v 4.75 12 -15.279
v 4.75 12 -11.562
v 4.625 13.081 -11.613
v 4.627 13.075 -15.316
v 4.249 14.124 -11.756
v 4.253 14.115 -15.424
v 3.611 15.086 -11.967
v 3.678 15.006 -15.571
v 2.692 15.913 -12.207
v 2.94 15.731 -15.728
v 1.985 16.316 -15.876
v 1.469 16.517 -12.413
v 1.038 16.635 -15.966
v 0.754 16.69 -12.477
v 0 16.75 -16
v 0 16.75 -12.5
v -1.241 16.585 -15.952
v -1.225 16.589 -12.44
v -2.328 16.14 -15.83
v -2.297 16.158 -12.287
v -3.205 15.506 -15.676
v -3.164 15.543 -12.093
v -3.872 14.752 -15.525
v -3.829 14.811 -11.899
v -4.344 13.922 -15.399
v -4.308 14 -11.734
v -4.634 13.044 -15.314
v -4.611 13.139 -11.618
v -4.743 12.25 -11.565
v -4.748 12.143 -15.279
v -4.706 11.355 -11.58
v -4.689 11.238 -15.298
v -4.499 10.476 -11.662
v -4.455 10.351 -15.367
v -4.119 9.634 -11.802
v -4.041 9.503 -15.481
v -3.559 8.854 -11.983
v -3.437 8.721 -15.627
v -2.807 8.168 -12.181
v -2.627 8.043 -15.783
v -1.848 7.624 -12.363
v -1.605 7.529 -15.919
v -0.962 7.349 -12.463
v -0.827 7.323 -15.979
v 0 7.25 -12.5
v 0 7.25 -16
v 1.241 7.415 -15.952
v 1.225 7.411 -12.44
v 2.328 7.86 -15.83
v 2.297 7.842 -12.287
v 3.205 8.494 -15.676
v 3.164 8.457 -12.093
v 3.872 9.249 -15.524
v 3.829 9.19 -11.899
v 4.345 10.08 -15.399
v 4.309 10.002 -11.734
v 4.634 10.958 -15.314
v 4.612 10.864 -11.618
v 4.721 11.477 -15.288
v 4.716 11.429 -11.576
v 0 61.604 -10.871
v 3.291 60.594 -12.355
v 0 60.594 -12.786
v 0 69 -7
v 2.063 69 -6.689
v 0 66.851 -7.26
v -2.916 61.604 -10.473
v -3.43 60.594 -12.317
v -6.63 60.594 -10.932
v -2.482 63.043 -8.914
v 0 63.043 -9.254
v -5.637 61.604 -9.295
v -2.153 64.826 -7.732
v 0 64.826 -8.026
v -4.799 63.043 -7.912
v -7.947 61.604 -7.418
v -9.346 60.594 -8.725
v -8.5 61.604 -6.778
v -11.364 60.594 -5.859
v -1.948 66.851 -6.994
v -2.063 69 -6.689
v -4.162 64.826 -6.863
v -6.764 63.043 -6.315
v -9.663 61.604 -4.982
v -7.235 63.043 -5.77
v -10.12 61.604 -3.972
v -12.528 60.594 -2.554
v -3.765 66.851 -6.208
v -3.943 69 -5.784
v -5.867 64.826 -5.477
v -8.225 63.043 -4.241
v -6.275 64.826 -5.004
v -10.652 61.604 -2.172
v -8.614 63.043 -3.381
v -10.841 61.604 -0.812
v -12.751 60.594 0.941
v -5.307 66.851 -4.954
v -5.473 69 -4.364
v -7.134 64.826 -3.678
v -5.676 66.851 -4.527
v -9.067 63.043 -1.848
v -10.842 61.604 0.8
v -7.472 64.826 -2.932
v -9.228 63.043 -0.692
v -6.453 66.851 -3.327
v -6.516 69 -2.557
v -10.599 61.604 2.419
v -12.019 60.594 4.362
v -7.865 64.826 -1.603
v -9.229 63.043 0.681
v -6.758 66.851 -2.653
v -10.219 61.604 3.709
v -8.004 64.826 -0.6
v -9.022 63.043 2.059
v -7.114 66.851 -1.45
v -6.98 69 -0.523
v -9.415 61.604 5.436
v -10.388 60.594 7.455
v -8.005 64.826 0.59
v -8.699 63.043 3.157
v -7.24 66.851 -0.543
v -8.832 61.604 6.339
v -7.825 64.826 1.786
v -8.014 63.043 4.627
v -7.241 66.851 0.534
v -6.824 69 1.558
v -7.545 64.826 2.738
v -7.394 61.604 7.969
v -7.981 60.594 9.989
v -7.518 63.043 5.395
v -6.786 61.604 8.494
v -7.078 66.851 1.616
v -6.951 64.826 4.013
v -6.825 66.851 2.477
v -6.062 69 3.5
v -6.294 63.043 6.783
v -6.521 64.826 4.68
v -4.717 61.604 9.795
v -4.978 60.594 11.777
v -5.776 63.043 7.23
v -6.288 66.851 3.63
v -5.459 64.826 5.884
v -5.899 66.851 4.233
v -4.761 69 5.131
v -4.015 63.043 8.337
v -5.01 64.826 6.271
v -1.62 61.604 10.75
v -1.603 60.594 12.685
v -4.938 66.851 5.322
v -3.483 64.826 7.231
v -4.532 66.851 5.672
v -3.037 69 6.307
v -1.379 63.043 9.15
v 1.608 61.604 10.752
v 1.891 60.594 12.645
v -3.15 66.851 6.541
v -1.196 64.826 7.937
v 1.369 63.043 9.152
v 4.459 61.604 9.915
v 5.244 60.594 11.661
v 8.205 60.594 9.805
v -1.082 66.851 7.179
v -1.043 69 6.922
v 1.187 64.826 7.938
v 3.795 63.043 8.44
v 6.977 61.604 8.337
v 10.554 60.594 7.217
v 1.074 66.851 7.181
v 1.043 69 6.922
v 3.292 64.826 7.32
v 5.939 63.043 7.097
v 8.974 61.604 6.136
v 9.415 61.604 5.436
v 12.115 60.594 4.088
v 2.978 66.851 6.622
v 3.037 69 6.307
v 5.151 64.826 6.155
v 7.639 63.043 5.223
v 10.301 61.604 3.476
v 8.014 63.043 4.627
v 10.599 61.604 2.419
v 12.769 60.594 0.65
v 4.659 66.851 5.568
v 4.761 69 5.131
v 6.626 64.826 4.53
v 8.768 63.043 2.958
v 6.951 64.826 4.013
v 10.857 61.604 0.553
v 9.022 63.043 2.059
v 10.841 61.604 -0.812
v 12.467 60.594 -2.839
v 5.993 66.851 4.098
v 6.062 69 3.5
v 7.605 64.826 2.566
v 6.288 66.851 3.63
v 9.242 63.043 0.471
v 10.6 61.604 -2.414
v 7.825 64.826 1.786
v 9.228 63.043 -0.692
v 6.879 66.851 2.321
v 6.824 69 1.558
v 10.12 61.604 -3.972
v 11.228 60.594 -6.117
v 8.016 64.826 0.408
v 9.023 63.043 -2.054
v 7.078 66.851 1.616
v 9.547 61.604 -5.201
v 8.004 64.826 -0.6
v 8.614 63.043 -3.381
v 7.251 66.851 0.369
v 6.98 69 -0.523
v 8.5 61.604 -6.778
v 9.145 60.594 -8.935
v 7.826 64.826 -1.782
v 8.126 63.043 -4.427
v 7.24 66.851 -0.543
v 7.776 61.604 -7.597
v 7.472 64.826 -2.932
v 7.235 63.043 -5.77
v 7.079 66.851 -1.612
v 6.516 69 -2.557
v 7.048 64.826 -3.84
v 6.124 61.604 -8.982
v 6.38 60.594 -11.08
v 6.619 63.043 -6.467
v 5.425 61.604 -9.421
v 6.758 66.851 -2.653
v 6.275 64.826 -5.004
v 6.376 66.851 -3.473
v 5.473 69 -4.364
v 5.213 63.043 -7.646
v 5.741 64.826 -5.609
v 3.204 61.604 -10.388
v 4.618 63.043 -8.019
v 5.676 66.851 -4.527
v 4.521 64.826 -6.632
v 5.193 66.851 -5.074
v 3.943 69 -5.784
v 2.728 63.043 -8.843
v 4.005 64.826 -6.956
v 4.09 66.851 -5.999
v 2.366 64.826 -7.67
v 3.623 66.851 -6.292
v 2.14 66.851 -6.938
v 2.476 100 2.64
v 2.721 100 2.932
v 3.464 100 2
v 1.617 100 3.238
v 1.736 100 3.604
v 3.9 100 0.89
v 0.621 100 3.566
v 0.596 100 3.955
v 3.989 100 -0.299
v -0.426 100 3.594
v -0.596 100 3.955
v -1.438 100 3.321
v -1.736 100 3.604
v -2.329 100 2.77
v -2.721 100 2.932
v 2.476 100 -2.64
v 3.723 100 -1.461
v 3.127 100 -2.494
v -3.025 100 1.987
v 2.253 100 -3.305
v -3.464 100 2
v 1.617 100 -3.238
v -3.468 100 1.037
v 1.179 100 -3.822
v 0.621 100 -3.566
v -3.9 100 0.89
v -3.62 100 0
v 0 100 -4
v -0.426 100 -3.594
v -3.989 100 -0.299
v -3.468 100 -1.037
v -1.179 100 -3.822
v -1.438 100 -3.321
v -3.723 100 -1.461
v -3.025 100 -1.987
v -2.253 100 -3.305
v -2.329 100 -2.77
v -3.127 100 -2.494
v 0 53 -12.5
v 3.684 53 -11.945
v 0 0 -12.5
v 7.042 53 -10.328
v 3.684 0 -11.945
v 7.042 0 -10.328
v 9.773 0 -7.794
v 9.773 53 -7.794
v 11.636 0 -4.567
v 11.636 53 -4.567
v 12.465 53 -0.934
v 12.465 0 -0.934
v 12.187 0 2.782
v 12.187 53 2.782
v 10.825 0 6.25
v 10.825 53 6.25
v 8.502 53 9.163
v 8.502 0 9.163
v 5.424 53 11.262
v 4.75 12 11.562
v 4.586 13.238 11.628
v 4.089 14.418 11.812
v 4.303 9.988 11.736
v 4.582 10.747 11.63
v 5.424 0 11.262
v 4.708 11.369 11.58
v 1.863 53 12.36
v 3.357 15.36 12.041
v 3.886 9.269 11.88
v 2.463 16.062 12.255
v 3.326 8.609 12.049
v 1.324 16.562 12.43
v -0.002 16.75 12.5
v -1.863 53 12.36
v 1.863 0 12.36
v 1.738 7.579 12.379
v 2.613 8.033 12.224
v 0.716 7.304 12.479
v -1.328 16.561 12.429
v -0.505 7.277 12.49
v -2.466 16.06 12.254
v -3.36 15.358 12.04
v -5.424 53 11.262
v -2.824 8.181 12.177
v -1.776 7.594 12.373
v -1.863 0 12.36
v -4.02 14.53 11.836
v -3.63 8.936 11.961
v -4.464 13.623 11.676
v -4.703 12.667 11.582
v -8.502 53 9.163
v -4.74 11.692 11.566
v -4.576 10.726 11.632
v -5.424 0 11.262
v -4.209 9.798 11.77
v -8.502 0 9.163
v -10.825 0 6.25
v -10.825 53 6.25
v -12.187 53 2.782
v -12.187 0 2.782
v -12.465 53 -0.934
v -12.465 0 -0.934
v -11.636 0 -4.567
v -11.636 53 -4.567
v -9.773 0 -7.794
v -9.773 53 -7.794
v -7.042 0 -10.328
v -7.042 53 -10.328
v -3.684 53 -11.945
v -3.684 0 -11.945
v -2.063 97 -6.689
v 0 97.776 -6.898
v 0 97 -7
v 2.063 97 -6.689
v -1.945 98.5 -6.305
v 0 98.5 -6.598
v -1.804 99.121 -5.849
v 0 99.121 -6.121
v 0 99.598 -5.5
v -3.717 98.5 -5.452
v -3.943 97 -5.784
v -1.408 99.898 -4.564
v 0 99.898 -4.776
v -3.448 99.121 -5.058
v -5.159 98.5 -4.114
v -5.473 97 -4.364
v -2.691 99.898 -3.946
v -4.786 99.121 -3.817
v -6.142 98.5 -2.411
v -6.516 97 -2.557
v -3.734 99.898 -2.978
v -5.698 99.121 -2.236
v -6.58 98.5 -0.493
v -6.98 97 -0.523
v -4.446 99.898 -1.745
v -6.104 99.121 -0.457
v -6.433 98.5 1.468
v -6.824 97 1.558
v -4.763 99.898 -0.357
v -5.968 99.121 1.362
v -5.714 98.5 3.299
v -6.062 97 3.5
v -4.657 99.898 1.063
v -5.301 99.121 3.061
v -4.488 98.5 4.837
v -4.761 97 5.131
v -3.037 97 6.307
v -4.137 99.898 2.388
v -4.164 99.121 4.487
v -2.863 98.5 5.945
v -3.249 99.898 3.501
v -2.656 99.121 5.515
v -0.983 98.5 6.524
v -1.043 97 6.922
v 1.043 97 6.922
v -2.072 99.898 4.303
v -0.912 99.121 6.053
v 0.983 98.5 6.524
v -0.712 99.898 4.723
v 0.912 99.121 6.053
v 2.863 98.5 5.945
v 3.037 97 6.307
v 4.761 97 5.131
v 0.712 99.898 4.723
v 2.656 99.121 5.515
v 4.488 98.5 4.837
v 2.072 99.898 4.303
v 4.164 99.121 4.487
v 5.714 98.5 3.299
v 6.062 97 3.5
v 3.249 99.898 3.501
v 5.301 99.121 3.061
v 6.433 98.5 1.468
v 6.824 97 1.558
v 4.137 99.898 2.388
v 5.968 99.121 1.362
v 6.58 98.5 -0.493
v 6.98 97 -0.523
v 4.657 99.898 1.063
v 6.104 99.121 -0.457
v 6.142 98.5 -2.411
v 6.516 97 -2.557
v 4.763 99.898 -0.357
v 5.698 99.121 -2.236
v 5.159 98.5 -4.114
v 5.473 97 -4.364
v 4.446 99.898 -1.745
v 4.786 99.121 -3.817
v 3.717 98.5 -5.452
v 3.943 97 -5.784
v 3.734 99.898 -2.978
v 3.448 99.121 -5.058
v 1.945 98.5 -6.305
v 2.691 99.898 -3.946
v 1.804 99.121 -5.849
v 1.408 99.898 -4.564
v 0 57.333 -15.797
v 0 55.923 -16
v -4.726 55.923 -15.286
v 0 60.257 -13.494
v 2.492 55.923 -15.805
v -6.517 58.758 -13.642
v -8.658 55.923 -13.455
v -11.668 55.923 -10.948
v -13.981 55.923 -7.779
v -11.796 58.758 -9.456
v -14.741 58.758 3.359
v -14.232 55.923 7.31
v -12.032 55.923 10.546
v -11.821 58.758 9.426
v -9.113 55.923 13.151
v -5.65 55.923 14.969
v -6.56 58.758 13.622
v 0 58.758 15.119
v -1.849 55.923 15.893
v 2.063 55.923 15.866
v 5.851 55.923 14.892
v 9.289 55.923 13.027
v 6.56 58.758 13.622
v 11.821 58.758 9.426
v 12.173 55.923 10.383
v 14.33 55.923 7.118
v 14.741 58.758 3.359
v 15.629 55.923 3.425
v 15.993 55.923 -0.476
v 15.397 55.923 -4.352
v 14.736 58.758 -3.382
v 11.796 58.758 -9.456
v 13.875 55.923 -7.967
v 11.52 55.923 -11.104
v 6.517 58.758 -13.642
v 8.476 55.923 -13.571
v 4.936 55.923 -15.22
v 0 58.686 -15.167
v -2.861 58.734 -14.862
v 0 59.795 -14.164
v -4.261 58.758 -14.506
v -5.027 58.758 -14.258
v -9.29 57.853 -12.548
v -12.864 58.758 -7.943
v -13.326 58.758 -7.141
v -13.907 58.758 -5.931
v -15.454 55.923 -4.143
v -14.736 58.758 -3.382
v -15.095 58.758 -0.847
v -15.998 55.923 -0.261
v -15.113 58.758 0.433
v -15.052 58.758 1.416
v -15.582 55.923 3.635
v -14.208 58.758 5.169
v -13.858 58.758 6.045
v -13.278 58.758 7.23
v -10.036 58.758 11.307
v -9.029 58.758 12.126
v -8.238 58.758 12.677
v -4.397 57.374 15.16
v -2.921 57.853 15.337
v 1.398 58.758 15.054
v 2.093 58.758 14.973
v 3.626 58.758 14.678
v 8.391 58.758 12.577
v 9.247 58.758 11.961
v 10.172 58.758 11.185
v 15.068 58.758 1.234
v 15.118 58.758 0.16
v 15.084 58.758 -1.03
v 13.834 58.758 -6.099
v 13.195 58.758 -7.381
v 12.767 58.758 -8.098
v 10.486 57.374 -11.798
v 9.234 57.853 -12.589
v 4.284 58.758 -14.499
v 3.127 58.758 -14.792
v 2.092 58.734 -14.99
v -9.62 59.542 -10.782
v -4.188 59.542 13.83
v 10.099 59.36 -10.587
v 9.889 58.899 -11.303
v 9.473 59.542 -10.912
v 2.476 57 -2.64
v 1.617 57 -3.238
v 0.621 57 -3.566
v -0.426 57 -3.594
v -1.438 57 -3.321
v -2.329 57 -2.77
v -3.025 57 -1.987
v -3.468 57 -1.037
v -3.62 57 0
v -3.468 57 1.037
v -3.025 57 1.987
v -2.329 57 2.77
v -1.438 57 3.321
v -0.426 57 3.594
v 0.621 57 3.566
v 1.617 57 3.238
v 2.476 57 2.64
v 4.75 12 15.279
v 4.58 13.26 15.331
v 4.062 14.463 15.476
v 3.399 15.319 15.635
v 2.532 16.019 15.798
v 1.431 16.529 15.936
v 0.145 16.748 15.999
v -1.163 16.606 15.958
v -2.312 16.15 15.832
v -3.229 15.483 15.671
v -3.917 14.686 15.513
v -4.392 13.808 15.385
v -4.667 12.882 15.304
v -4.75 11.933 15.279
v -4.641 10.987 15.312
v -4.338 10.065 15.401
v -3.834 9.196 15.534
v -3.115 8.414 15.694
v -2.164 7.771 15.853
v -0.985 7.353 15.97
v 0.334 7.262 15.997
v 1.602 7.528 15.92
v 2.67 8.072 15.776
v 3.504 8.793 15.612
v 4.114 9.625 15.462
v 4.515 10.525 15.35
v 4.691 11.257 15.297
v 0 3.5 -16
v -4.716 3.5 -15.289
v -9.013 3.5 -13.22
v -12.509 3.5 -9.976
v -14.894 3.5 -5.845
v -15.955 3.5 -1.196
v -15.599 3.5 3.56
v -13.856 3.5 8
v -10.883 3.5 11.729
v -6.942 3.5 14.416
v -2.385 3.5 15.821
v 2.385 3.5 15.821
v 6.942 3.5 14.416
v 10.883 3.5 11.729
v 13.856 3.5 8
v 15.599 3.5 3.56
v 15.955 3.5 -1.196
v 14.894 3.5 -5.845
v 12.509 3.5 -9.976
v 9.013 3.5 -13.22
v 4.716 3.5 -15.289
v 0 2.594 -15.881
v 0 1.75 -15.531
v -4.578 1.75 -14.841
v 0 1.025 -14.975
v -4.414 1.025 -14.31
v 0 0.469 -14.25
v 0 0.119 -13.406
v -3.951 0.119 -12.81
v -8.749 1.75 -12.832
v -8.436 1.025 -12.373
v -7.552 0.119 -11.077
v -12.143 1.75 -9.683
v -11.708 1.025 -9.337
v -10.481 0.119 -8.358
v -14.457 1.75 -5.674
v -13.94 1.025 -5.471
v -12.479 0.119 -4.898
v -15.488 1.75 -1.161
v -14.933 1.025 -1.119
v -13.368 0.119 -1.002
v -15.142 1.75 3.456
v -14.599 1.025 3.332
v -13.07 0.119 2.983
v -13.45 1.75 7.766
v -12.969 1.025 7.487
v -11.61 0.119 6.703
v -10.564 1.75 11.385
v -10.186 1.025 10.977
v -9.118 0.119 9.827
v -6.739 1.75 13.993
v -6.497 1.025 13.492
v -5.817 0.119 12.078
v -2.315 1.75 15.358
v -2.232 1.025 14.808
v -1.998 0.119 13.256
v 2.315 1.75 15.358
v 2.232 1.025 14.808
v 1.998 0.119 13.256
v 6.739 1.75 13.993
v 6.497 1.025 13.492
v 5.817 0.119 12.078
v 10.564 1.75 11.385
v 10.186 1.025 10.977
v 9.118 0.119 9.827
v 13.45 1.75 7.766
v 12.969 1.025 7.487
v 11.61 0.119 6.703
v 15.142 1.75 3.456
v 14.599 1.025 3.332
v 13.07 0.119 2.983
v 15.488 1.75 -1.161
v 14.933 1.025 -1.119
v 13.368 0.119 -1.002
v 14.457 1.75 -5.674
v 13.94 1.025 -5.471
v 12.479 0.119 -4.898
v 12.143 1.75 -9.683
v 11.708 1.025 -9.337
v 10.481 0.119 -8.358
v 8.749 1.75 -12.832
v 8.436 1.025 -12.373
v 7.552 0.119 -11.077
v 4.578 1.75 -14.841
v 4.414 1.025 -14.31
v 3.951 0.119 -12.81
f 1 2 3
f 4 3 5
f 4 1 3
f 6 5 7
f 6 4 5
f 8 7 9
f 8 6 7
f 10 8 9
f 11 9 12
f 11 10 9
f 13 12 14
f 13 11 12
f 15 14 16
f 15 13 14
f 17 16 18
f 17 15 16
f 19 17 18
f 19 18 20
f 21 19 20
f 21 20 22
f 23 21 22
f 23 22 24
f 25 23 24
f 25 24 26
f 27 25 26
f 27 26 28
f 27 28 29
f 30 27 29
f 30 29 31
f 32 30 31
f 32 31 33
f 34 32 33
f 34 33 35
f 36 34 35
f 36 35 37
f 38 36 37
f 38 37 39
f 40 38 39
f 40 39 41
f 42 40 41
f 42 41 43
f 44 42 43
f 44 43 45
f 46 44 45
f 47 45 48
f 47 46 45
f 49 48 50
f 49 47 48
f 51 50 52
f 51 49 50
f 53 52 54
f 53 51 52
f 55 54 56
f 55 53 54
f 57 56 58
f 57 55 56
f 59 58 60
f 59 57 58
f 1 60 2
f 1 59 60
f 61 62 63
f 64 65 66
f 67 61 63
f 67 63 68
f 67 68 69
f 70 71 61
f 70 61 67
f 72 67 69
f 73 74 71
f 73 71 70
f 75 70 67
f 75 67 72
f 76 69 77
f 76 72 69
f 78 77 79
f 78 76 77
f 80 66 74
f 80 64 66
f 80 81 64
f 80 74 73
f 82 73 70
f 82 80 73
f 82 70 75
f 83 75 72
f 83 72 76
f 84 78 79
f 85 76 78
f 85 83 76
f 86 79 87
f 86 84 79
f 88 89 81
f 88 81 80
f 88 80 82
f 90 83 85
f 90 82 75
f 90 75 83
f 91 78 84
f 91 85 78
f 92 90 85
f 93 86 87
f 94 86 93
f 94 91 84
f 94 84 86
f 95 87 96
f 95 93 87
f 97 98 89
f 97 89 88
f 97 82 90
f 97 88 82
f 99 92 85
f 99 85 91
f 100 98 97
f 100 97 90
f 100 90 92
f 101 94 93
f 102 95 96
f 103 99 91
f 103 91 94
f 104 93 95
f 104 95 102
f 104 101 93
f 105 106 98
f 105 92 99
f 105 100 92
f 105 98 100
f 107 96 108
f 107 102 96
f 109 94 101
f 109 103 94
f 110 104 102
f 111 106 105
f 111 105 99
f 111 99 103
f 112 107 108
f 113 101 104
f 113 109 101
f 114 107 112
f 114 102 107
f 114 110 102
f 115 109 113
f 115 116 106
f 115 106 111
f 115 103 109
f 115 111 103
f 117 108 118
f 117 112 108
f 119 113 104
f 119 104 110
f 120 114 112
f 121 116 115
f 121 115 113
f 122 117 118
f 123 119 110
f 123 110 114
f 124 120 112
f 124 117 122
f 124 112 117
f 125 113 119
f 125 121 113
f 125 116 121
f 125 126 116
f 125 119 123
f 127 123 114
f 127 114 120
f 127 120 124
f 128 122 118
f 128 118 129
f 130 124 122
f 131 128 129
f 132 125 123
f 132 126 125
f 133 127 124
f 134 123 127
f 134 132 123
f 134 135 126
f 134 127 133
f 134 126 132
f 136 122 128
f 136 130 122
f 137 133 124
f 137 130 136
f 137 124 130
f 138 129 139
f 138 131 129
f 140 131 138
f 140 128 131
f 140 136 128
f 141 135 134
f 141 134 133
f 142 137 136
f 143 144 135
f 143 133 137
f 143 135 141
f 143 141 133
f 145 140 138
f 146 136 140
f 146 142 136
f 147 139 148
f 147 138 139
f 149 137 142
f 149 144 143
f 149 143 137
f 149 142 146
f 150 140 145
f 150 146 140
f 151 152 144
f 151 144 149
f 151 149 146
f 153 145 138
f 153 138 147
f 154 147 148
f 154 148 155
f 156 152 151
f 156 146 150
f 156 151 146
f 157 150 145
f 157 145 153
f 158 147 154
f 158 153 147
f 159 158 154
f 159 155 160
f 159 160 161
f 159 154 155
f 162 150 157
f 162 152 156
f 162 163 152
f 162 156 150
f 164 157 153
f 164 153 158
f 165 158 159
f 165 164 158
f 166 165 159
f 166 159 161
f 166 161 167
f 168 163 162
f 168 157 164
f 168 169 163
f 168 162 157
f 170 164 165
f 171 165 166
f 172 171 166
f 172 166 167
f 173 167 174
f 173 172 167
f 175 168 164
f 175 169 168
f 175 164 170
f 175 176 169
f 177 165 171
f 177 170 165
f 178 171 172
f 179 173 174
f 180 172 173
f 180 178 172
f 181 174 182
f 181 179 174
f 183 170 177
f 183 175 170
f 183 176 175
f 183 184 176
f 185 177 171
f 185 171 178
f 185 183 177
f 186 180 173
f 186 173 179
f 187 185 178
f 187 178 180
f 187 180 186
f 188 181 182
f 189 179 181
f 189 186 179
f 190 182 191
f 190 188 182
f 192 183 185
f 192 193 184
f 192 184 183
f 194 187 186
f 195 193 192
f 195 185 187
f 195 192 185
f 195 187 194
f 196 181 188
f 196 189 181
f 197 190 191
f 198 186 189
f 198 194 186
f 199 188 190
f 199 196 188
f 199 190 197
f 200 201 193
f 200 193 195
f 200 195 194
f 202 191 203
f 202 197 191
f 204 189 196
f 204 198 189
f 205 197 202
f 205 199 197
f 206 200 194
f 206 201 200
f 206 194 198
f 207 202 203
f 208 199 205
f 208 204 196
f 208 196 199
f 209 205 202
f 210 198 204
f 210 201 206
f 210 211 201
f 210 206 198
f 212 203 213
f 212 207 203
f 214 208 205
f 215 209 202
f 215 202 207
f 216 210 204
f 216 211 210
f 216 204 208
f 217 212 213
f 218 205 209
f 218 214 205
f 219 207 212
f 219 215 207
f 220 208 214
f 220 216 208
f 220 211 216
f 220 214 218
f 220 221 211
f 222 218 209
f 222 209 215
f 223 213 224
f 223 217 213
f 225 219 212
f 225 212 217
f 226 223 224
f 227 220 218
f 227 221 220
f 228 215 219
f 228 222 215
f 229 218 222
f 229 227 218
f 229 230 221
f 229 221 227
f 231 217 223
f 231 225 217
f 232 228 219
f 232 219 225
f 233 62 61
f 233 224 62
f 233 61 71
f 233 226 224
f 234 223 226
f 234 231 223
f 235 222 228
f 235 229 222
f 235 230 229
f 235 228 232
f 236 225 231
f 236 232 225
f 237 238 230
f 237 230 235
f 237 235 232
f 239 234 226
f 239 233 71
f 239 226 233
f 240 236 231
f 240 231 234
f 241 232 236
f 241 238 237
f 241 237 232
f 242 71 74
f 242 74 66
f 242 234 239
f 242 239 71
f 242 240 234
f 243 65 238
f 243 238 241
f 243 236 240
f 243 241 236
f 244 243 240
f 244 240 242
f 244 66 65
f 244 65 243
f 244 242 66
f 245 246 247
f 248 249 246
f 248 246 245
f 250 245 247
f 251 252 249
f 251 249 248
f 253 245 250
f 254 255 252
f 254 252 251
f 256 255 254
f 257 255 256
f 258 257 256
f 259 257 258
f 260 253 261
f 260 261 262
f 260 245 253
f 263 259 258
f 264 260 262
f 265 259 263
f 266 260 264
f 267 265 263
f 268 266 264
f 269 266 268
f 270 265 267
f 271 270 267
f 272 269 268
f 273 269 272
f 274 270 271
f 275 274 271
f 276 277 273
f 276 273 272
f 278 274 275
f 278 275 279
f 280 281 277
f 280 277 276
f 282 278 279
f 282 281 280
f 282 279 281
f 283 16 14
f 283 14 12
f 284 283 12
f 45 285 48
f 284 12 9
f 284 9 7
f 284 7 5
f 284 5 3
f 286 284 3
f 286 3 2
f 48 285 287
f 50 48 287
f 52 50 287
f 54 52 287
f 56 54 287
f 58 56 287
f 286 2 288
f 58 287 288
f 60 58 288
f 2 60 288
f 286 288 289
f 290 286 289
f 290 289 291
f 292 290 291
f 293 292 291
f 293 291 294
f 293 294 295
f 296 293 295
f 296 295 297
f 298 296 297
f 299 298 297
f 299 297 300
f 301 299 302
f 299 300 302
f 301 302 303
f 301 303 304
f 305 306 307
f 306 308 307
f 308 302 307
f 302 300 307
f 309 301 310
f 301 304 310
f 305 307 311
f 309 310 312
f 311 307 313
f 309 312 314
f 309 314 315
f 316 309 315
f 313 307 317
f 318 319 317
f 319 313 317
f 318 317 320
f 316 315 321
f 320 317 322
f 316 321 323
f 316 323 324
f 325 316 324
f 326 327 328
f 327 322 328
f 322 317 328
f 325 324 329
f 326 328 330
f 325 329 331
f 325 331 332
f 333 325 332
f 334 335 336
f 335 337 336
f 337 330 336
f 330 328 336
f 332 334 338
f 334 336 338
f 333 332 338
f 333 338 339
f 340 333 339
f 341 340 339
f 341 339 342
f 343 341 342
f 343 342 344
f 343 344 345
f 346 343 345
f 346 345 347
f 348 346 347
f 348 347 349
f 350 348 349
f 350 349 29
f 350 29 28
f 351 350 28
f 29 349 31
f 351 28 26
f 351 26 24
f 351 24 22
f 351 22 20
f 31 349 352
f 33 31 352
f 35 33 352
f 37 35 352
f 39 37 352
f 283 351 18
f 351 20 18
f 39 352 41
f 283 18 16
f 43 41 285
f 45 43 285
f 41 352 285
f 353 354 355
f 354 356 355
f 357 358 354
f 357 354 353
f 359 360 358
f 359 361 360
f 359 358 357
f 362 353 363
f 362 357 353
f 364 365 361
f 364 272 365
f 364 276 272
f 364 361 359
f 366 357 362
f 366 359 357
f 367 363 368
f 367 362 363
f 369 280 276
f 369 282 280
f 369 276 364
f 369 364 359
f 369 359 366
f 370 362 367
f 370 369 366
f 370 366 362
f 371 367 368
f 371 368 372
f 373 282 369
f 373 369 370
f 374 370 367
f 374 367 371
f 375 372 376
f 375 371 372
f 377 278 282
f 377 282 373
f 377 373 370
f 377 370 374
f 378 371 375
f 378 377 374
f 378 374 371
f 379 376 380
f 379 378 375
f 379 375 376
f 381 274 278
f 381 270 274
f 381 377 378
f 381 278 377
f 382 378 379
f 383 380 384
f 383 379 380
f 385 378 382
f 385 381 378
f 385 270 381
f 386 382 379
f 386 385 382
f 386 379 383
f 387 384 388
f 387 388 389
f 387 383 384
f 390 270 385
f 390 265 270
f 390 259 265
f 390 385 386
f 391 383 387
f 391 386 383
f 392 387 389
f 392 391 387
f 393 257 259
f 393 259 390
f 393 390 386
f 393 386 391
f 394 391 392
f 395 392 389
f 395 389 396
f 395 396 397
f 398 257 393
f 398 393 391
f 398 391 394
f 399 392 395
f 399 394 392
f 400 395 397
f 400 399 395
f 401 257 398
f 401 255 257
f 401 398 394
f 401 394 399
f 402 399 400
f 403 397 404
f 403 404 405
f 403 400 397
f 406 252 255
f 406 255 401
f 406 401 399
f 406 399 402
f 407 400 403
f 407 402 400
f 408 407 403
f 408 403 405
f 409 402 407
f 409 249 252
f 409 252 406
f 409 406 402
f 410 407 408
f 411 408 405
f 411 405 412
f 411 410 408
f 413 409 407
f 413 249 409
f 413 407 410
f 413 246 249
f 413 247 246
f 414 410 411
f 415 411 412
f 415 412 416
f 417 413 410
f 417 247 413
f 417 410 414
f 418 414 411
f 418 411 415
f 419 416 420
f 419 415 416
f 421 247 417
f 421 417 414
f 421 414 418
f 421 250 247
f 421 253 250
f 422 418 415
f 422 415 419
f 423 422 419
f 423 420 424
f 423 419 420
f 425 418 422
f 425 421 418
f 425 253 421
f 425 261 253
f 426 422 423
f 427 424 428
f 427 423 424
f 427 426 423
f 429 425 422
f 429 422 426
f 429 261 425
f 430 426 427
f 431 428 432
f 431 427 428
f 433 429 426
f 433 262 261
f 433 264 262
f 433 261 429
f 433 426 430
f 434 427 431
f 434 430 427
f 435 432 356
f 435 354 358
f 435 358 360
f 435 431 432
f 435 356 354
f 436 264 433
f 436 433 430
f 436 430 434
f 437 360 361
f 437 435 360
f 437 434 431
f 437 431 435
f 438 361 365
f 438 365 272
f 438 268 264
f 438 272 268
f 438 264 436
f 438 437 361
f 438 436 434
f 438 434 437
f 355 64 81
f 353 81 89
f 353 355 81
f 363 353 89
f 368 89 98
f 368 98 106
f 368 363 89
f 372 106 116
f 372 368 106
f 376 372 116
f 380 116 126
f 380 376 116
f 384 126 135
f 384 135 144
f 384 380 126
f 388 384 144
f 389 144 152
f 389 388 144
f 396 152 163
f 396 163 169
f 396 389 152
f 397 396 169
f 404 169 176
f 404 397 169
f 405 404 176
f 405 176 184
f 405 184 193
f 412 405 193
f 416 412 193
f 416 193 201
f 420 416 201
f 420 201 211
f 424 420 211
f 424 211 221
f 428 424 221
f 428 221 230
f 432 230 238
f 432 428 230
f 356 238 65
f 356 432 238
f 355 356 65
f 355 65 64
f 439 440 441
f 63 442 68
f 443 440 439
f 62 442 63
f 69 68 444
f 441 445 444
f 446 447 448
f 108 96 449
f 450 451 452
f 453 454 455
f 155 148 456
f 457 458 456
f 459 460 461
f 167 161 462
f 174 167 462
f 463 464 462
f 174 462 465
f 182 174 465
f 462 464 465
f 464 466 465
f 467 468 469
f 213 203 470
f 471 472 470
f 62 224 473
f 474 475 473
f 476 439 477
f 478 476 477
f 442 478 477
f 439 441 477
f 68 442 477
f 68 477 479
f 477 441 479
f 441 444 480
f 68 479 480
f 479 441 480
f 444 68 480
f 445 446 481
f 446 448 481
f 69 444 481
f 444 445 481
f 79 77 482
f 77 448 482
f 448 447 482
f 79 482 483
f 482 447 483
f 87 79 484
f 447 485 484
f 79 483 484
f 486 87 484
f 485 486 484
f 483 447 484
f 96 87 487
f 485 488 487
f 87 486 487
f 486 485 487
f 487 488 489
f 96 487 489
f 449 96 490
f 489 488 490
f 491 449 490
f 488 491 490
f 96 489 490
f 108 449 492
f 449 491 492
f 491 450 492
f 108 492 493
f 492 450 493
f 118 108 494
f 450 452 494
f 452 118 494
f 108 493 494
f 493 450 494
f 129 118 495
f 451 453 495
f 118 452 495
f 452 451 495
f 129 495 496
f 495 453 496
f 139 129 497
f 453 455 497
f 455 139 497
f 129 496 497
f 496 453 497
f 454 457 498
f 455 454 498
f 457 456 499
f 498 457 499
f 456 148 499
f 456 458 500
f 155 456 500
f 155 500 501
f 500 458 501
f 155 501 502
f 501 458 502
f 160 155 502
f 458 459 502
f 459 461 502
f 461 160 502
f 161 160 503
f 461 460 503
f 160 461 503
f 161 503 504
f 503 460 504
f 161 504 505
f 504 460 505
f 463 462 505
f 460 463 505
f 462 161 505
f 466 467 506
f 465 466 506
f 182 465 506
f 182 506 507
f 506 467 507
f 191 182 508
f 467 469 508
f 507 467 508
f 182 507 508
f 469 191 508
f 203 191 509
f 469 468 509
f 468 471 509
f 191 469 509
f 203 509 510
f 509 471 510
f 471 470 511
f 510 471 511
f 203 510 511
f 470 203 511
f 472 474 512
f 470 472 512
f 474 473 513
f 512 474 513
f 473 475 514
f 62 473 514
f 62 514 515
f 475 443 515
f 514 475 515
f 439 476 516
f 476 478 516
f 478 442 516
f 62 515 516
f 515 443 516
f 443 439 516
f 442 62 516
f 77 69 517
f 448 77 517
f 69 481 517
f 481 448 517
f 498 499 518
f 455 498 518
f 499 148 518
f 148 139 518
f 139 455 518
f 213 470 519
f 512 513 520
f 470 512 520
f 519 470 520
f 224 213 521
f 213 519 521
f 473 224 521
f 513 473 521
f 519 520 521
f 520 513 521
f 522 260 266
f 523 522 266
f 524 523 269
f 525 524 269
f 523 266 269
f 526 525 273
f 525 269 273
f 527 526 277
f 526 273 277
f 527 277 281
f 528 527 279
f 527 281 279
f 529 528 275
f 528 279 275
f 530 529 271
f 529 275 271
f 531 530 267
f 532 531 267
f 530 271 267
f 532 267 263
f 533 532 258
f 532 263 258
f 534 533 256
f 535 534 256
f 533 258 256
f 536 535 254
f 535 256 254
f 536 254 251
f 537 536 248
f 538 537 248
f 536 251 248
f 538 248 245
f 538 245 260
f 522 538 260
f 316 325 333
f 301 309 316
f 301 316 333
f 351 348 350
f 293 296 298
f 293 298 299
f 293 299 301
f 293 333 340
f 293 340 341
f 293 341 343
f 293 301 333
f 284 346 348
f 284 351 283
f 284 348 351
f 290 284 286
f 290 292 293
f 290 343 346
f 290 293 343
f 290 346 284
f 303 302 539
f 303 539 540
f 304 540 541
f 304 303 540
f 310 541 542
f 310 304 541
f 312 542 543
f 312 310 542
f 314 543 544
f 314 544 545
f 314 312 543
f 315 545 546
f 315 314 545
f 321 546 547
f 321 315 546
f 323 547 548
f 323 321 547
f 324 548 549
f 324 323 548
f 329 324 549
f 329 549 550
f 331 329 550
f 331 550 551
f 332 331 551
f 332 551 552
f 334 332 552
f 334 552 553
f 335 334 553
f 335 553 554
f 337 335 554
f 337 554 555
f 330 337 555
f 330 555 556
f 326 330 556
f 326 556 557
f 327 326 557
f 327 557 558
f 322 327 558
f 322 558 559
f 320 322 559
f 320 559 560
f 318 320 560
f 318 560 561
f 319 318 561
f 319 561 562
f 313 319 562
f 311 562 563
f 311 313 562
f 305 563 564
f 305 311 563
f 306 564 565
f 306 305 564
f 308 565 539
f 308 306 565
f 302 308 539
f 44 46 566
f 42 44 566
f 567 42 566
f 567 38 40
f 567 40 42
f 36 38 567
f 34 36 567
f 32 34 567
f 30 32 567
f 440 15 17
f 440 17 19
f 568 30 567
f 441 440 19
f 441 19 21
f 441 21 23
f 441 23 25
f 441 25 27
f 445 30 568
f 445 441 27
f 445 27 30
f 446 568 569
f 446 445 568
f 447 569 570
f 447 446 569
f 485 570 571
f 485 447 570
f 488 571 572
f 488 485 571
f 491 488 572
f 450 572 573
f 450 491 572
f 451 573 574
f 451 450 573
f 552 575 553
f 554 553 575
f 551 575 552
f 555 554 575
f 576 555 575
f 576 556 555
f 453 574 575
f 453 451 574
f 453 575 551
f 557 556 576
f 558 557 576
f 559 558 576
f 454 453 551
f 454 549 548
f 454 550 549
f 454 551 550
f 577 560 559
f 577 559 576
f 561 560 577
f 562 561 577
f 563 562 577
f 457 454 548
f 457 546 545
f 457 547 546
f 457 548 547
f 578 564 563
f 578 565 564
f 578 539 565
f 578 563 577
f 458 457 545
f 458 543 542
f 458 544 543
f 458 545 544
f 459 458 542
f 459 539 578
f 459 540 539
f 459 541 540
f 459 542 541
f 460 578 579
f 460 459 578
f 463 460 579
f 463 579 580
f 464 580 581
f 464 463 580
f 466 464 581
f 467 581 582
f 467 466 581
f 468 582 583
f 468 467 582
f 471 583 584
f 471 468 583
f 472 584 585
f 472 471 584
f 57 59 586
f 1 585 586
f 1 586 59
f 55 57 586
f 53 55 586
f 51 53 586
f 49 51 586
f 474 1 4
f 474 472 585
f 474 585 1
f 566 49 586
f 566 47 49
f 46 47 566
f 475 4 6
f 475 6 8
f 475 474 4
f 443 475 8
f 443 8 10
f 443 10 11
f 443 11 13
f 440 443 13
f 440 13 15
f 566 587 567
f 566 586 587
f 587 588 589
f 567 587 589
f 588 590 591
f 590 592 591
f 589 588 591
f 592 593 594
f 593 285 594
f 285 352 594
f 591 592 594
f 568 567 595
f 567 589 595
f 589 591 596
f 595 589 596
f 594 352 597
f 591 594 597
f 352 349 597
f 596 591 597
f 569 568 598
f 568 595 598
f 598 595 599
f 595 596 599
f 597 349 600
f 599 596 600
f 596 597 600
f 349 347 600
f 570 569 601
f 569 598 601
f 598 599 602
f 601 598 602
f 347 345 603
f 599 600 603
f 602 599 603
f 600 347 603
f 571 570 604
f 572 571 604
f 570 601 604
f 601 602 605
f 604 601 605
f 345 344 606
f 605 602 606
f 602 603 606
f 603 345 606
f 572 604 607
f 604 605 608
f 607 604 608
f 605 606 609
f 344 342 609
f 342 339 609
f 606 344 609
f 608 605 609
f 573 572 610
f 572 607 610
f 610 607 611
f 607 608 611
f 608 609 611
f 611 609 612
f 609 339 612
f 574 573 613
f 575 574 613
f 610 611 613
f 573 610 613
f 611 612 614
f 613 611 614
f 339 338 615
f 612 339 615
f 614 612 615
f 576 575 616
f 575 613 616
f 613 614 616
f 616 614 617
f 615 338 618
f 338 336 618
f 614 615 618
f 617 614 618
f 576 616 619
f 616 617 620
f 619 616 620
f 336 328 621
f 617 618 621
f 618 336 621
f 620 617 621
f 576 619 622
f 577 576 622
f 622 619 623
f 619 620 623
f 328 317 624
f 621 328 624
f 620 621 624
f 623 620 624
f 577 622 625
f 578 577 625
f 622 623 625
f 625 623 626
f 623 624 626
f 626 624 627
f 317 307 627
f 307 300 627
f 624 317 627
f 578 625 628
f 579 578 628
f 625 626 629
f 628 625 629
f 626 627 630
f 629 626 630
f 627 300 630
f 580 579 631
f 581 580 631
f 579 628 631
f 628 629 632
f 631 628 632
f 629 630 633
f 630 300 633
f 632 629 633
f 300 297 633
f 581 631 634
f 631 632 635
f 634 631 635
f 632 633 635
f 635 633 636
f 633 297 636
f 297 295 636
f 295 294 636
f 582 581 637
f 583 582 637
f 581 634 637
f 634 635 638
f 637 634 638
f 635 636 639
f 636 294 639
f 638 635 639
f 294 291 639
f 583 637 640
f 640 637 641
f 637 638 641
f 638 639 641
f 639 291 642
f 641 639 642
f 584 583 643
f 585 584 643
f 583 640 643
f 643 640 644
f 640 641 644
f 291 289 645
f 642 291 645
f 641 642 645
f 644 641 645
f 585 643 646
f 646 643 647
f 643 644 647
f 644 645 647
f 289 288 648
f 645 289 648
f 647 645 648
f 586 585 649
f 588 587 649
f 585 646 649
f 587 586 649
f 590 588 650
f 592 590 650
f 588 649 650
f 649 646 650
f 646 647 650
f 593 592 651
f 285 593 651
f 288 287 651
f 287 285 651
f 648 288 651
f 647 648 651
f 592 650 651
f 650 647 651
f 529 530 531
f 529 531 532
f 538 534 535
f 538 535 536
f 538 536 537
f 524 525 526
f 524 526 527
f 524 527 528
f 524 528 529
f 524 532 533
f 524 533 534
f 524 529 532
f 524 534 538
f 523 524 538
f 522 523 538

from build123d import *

# Parameters (mm, degrees)
CUT_EXTRUDE1_DEPTH      = 103.528044944
CUT_EXTRUDE1_DEPTH_BACK = 103.528044944
SKETCH2_R               = 4.75
SKETCH3_R               = 12.5
CUT_EXTRUDE2_DEPTH      = 53
CUT_EXTRUDE3_DEPTH      = 43
FILLET1_R               = 5
FILLET2_R               = 3
FILLET3_R               = 3.5


with BuildPart() as part:
    # Sketch1 → Revolve1 (revolve)
    with BuildSketch(Plane(origin=(0, 0, 0), x_dir=(0, 0, -1), z_dir=(1, 0, 0)), mode=Mode.PRIVATE) as revolve1_sk:
        with BuildLine():
            Line((0, 0), (-16, 0))
            Line((-16, 0), (-16, 60))
            ThreePointArc((-16, 60), (-9.636038969, 62.636038969), (-7, 69))
            Line((-7, 69), (-7, 80))
            Line((-7, 80), (-7, 100))
            Line((-7, 100), (0, 100))
            Line((0, 100), (0, 0))
        make_face()
    revolve(revolve1_sk.sketch.rotate(Axis((0, 2.411465541, 0), (0, 1, 0)), 180), axis=Axis((0, 2.411465541, 0), (0, 1, 0)))

    # Sketch2 → Cut-Extrude1 (cut, two sides: drawn at the far end of the back side and taken through both)
    with BuildSketch(Plane.XY.offset(-CUT_EXTRUDE1_DEPTH_BACK)):
        with Locations((0, 12)):
            Circle(SKETCH2_R)
    extrude(amount=CUT_EXTRUDE1_DEPTH + CUT_EXTRUDE1_DEPTH_BACK, mode=Mode.SUBTRACT)

    # Sketch3 → Cut-Extrude2 (cut)
    with BuildSketch(Plane.XZ):
        with Locations(Location((0, 0, 0), (0, 0, 270))):
            Circle(SKETCH3_R)
    extrude(amount=-CUT_EXTRUDE2_DEPTH, mode=Mode.SUBTRACT)

    # Sketch4 → Cut-Extrude3 (cut)
    with BuildSketch(Plane(origin=(0, 100, 0), x_dir=(1, 0, 0), z_dir=(0, 1, 0))):
        with BuildLine():
            Line((2.4765, -2.639645431), (2.4765, 2.639645431))
            ThreePointArc((2.4765, 2.639645431), (-3.6195, 0), (2.4765, -2.639645431))
        make_face()
    extrude(amount=-CUT_EXTRUDE3_DEPTH, mode=Mode.SUBTRACT)

    # Fillet1
    fillet1_edges = [part.edges().sort_by_distance(p)[0] for p in [
        (0, 60, 16),
    ]]
    fillet(fillet1_edges, radius=FILLET1_R)

    # Fillet2
    fillet2_edges = [part.edges().sort_by_distance(p)[0] for p in [
        (0, 100, 7),
    ]]
    fillet(fillet2_edges, radius=FILLET2_R)

    # Fillet3
    fillet3_edges = [part.edges().sort_by_distance(p)[0] for p in [
        (0, 0, 16),
    ]]
    fillet(fillet3_edges, radius=FILLET3_R - 0.0001)  # a hair under: the kernel refuses the full size


solid = part.part
